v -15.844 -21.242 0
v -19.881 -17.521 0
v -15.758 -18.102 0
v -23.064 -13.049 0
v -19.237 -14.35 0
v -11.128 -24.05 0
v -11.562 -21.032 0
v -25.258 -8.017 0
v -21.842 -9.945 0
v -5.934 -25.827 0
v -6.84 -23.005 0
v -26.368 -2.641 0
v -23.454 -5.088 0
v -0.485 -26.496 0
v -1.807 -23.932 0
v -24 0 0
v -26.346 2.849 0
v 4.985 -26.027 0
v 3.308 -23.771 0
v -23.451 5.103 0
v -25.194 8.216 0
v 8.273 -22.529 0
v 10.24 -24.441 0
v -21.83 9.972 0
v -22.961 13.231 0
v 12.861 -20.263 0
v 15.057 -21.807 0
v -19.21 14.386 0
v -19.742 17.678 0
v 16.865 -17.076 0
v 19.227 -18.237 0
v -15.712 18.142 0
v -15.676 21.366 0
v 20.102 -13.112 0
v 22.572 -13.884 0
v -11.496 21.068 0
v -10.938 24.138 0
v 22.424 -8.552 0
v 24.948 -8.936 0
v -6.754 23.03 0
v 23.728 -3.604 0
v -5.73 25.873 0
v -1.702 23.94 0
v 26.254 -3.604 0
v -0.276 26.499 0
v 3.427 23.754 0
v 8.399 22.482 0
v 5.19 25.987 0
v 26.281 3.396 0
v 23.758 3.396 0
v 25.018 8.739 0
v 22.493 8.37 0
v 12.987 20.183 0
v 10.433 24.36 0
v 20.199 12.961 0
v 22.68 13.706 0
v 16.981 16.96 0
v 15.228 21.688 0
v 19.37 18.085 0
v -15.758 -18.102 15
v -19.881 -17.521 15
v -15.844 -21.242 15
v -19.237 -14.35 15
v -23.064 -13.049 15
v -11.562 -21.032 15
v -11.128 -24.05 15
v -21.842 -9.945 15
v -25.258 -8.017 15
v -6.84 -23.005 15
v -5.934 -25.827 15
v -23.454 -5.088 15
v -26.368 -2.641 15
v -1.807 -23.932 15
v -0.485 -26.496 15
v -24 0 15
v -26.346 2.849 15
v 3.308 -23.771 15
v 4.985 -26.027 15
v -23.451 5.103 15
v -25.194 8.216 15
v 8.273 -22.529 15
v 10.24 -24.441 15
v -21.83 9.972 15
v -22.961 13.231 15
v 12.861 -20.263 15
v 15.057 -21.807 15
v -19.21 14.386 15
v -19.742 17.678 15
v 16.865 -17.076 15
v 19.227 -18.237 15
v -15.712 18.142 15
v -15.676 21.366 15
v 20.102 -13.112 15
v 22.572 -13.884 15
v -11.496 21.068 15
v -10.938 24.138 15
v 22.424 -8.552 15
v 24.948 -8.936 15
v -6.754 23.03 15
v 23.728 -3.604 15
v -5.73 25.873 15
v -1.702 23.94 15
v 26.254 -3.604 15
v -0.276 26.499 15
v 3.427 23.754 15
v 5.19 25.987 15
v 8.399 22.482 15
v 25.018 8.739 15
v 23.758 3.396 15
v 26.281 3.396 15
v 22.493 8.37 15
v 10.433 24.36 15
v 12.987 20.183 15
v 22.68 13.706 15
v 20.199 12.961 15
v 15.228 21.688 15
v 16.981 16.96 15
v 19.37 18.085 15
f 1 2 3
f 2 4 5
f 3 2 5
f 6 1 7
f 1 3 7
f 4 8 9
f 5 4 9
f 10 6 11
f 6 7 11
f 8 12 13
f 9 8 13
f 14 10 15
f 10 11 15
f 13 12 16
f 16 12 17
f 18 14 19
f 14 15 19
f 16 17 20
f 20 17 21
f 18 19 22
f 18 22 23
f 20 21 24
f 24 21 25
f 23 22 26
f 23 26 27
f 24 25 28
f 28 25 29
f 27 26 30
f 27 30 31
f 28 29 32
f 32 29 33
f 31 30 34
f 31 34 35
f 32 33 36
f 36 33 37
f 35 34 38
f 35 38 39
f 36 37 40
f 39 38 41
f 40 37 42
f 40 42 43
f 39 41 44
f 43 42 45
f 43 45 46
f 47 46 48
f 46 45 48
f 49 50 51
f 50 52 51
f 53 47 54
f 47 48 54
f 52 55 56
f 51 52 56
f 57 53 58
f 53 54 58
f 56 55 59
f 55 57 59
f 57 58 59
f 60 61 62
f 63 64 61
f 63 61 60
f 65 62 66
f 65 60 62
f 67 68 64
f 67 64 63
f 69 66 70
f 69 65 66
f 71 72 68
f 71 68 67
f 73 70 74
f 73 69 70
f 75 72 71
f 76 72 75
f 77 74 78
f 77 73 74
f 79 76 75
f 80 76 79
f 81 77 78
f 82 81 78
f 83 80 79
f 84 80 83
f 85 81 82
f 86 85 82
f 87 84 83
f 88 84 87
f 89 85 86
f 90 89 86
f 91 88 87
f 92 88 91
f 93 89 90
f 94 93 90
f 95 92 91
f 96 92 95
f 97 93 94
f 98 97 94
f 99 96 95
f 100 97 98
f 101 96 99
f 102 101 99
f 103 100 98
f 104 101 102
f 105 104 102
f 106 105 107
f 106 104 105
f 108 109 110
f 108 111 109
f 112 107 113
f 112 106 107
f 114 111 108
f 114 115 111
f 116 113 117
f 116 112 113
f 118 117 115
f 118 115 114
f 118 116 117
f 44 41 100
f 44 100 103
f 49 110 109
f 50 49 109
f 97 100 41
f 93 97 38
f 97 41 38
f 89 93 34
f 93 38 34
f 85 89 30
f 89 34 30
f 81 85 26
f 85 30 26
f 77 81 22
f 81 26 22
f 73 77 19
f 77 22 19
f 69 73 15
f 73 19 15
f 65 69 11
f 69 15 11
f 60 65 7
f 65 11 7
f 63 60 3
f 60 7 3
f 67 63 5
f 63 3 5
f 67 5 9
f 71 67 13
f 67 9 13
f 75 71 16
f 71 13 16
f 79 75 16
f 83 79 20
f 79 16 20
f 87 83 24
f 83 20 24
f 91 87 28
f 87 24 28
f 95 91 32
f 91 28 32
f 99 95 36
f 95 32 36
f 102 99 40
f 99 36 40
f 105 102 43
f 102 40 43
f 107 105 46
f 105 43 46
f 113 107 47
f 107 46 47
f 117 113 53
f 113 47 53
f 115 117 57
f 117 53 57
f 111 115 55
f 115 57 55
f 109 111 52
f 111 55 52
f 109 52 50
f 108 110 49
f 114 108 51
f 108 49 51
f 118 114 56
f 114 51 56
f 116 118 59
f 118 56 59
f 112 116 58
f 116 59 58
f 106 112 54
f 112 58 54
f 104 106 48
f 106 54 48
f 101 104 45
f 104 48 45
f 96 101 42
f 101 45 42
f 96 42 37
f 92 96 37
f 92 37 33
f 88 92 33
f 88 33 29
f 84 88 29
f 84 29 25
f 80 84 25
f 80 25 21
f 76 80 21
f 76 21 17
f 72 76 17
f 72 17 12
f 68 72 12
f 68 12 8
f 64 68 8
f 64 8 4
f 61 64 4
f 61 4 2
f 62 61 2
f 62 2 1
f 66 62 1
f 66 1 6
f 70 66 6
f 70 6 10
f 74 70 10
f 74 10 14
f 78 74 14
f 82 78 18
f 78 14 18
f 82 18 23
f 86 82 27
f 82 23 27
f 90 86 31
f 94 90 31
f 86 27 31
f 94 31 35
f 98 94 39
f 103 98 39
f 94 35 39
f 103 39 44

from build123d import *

# Parameters (mm, degrees)
F0_R     = 26.5
F1_DEPTH = 15
F3_D     = 48
F5_DEPTH = 15.001


with BuildPart() as f1:
    # F0 (on Top) → F1 (new body)
    with BuildSketch(Plane.XY):
        Circle(F0_R)
    extrude(amount=F1_DEPTH)

    # F3 (through all)
    with Locations(Plane.XY.offset(15)):
        with Locations((0, 0)):
            Hole(F3_D / 2)

    # F4 (on face) → F5 (cut, through all)
    with BuildSketch(Plane.XY.offset(15)):
        with BuildLine():
            Line((26.2814522422, 3.396361), (23.7584665321, 3.396361))
            ThreePointArc((23.7584665321, 3.396361), (23.9395404798, 1.7024692698), (24, 0))
            ThreePointArc((24, 0), (23.9318812143, -1.8069481297), (23.7279115381, -3.603639))
            Line((23.727911538, -3.603639), (26.2538337383, -3.603639))
            ThreePointArc((26.2538337383, -3.603639), (26.4383868084, -1.8060185402), (26.5, 0))
            ThreePointArc((26.5, 0), (26.4453066197, 1.7016926254), (26.2814522422, 3.396361))
        make_face()
    extrude(amount=-F5_DEPTH, mode=Mode.SUBTRACT)


solid = f1.part
